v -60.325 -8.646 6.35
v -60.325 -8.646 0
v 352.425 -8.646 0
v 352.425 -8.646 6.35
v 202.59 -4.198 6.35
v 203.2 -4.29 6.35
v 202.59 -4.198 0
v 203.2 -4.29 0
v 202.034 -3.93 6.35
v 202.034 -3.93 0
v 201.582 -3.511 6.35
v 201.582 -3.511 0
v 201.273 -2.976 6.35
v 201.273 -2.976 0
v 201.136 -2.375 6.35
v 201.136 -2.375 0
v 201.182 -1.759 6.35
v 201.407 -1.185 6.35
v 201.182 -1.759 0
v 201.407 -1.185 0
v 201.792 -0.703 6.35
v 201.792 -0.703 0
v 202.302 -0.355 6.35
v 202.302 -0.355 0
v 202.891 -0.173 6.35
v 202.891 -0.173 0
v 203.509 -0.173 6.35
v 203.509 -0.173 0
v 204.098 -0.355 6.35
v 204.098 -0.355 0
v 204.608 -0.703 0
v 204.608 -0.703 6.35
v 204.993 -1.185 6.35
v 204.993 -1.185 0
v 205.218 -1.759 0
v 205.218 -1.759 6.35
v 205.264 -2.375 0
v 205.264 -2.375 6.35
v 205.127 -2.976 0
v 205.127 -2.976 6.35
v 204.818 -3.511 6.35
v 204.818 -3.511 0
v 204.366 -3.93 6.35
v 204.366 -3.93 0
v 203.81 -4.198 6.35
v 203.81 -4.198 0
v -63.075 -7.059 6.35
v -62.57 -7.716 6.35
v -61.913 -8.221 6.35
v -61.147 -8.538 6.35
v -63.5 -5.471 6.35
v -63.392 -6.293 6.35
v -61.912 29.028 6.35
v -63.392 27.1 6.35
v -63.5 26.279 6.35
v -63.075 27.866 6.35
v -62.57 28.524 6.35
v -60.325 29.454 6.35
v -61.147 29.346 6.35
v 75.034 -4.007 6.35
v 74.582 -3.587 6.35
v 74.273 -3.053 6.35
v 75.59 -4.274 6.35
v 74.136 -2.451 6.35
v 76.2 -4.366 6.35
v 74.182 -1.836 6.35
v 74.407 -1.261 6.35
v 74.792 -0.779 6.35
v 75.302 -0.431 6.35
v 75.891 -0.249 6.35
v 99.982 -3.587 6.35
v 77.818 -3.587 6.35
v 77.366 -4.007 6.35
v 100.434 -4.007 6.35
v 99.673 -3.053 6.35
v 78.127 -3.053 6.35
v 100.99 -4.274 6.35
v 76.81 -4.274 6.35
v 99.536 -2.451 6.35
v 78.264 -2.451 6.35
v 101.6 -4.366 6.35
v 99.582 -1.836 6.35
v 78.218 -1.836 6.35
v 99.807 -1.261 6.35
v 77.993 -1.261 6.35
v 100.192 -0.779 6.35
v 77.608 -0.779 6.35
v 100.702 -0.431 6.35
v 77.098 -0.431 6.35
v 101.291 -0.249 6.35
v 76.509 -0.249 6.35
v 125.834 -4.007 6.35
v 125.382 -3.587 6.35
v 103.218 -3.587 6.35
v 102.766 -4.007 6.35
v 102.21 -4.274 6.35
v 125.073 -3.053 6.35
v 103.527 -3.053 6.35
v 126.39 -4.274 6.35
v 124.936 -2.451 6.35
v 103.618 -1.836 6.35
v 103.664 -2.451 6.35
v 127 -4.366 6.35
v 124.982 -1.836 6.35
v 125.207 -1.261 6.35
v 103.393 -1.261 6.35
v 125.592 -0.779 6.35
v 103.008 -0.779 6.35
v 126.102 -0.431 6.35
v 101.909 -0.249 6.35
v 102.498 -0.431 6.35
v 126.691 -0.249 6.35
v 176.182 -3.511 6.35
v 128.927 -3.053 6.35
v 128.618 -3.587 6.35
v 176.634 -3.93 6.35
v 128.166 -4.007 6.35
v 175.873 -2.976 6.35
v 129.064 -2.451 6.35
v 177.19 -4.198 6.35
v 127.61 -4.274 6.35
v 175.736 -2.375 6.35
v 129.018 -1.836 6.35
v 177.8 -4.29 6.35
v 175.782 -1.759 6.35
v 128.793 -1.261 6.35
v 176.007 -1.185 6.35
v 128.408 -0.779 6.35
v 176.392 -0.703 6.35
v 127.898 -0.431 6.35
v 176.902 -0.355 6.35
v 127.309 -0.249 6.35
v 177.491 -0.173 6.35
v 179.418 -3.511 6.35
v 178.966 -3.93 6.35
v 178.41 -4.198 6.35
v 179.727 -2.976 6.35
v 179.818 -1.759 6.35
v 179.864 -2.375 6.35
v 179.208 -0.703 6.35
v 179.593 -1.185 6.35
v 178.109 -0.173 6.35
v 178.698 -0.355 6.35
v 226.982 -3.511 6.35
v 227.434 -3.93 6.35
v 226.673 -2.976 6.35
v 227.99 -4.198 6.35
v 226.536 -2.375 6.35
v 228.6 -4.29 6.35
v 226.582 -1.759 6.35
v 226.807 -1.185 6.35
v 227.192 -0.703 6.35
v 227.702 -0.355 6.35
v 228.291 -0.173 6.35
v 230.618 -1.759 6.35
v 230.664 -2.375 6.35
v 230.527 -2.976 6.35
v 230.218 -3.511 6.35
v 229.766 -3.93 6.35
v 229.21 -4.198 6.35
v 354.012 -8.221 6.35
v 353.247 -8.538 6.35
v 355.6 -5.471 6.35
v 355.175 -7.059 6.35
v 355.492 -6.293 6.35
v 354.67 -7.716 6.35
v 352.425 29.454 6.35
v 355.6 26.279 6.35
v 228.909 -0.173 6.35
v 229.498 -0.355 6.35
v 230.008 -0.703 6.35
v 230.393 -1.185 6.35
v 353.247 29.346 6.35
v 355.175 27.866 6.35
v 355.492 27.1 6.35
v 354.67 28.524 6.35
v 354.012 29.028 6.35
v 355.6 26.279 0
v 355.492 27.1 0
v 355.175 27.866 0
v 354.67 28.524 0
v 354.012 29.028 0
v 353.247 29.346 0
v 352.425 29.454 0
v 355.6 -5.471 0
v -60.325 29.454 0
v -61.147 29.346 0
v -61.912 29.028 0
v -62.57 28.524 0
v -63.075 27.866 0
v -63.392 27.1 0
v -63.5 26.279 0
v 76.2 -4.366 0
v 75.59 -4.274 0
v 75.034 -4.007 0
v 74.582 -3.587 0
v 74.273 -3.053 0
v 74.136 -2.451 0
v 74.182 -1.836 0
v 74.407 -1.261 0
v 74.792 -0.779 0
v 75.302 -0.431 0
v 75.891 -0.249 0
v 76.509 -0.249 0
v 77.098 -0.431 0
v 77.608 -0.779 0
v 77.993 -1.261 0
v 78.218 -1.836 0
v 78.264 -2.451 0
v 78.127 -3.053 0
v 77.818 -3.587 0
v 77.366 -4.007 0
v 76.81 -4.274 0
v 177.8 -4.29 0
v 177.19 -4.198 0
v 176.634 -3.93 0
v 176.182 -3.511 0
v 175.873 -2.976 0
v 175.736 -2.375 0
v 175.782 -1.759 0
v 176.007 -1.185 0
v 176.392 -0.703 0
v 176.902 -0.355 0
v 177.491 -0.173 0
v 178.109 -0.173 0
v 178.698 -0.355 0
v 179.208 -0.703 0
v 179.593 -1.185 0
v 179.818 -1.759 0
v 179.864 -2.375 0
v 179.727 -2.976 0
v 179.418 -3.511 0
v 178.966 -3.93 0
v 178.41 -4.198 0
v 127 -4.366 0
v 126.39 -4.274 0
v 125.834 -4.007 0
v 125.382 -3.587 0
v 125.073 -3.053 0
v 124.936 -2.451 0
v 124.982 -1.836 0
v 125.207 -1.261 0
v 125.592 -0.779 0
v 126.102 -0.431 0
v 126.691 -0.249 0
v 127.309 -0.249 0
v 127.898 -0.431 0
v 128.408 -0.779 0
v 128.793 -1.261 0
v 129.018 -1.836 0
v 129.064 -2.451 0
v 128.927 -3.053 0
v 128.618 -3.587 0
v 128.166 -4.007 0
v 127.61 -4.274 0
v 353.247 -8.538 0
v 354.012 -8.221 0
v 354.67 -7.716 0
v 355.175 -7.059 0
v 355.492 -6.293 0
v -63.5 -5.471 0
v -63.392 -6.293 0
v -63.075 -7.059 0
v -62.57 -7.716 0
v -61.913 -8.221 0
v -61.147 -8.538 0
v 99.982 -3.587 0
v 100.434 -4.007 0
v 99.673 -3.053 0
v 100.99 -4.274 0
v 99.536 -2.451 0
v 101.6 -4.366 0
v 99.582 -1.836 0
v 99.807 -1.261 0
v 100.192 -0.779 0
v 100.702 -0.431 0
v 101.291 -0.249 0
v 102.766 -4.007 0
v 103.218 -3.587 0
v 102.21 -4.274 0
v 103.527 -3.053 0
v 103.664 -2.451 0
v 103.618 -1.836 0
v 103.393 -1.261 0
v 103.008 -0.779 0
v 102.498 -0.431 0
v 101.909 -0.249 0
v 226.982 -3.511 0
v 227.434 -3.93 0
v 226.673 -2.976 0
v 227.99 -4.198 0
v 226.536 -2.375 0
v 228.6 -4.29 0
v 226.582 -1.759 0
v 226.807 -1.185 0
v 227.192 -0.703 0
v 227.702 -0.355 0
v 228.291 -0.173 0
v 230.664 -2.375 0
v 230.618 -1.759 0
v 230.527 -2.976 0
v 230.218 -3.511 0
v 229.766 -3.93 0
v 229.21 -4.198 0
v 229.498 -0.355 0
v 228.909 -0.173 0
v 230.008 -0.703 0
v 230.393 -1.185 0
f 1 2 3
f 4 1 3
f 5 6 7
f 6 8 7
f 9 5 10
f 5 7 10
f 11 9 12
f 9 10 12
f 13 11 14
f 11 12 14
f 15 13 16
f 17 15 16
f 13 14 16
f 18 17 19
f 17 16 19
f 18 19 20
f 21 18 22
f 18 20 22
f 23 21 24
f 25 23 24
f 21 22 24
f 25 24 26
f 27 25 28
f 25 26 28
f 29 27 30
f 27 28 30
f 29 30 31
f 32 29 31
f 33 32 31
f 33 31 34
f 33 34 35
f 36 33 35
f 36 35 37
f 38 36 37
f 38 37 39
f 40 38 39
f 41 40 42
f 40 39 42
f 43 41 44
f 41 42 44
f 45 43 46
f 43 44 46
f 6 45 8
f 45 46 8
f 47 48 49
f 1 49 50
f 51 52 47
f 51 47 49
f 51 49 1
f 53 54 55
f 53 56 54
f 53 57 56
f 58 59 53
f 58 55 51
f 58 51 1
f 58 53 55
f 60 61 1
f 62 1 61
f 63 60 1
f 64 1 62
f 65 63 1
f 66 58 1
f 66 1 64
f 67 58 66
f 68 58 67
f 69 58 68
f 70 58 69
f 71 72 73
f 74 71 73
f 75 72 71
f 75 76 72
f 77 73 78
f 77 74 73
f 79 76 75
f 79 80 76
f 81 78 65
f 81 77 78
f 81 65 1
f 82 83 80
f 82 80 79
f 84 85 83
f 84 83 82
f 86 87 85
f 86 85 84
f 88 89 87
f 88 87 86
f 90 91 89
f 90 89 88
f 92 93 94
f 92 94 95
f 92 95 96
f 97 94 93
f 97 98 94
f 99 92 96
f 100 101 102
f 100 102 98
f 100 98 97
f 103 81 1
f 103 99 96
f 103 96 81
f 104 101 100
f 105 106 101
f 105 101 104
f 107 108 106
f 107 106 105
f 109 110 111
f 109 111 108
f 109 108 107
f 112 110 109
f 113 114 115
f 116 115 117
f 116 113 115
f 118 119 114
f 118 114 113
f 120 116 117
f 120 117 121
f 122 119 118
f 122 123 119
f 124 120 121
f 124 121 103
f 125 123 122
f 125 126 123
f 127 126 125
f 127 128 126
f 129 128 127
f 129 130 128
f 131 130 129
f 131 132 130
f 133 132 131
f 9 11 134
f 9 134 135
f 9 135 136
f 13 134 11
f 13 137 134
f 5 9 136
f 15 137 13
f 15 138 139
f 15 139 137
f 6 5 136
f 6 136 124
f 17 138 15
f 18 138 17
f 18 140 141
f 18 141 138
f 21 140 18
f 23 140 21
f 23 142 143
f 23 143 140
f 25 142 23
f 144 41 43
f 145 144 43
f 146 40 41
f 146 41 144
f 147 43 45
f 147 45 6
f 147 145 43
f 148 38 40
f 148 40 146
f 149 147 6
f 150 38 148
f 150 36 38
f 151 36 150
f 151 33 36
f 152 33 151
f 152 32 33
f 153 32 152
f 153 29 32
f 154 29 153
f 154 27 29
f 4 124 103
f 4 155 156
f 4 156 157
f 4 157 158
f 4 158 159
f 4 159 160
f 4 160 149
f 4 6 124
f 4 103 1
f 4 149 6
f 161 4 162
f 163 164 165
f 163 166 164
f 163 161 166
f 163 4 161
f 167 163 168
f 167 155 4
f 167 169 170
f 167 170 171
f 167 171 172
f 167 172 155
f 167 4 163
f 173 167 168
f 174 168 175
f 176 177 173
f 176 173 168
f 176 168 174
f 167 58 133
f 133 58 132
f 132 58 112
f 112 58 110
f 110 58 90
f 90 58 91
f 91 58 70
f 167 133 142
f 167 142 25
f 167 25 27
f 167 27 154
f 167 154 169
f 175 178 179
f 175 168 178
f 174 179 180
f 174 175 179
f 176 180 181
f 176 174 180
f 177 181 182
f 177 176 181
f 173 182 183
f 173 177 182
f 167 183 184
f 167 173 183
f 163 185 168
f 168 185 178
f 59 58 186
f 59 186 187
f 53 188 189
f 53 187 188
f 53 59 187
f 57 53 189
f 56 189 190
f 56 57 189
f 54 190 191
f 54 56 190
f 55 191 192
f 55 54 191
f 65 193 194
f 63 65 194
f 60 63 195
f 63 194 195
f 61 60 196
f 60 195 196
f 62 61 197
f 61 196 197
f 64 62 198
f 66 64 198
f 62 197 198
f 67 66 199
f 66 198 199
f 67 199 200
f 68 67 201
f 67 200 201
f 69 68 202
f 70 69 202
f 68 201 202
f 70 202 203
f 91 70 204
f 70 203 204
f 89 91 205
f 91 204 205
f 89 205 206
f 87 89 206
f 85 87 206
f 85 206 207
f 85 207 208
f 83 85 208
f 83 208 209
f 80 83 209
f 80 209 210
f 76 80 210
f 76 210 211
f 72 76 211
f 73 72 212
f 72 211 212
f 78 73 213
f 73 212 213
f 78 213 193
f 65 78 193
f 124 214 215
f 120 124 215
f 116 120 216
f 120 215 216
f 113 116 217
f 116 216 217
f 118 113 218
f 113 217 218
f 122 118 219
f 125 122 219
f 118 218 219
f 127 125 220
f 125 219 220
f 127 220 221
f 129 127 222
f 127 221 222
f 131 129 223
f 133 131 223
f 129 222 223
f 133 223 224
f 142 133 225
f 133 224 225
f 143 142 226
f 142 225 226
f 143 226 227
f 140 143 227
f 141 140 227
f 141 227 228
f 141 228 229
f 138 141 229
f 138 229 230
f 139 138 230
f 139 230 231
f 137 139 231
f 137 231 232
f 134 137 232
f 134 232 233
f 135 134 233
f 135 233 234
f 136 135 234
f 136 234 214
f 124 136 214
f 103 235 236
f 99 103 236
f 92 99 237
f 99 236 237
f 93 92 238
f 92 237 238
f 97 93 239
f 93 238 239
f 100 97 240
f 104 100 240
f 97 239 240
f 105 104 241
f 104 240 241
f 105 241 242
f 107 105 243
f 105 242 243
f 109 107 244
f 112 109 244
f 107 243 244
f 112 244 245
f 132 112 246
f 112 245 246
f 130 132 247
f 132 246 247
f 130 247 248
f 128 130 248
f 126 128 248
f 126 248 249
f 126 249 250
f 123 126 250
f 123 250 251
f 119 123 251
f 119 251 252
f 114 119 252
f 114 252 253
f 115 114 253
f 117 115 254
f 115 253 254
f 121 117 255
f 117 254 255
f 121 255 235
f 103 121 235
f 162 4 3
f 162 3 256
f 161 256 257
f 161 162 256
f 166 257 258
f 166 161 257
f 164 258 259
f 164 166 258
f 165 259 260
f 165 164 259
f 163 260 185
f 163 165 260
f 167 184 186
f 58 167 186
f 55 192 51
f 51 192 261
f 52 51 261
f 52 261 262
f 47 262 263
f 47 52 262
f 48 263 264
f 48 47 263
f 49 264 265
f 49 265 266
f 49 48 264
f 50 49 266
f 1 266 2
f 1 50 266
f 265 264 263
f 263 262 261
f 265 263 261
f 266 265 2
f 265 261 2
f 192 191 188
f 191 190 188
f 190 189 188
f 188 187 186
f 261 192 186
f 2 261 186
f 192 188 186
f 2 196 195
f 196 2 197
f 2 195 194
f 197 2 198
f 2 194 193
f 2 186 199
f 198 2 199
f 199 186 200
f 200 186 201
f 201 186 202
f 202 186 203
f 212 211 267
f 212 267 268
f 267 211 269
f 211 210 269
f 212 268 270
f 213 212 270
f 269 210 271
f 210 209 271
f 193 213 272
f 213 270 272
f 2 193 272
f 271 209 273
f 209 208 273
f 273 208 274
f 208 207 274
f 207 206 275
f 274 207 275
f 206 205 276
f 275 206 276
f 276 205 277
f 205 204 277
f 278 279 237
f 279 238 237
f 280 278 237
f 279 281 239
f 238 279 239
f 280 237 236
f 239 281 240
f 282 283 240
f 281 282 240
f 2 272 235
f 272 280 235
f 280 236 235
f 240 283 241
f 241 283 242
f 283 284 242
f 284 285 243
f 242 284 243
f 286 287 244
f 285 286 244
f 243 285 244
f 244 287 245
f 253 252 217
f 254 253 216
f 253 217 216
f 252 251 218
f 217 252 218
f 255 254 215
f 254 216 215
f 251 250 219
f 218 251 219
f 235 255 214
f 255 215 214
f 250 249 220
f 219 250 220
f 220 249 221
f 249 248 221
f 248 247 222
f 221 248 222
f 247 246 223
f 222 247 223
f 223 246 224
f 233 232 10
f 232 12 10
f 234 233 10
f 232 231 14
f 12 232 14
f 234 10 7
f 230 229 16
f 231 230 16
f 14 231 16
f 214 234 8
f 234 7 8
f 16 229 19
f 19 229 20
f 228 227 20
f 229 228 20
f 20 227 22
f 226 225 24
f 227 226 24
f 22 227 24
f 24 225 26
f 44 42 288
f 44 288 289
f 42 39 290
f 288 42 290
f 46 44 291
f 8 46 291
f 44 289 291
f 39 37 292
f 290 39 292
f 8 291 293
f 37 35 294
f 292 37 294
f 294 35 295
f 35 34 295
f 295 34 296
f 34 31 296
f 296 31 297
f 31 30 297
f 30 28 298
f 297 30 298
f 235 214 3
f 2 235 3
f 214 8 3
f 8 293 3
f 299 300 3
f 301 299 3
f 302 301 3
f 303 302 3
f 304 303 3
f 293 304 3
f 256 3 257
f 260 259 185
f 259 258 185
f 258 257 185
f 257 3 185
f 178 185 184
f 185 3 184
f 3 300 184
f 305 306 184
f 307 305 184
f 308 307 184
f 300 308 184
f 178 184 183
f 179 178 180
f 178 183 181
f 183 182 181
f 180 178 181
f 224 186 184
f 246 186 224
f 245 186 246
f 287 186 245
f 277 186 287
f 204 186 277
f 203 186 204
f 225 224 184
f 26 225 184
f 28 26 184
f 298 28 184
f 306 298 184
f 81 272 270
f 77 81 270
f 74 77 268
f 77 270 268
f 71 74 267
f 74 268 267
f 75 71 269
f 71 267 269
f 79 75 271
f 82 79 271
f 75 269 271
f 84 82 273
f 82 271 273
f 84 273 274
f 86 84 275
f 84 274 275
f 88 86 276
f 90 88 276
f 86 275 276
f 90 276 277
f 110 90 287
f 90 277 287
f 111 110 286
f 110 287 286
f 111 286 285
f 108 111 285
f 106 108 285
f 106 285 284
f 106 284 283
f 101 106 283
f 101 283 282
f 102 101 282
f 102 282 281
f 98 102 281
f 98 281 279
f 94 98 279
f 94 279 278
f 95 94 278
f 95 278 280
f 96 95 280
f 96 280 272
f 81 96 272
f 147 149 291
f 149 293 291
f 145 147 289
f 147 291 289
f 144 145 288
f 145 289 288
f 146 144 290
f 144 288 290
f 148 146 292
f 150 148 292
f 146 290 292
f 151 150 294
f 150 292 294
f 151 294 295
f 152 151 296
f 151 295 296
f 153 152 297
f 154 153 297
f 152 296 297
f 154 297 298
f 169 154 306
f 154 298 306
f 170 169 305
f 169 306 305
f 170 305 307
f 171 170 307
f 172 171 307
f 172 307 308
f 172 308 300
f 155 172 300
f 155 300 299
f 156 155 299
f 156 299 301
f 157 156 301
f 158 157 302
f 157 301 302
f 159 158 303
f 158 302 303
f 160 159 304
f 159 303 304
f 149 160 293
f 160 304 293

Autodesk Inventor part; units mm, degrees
ref_plane "YZ Plane" through (0, 0, 0) normal (1, 0, 0) x (0, 1, 0)
ref_plane "XZ Plane" through (0, 0, 0) normal (0, 1, 0) x (-1, 0, 0)
sketch "Sketch1" plane through (0, 0, 0) normal (0, 0, 1) x (1, 0, 0)
  line L0 (-63.5, -8.6463) -> (355.6, -8.6463)
  line L1 (355.6, -8.6463) -> (355.6, 29.4537)
  line L2 (355.6, 29.4537) -> (-63.5, 29.4537)
  line L3 (-63.5, 29.4537) -> (-63.5, -8.6463)
  line L4 (355.6, -8.6463) -> (69.85, -8.6463)
  point P0 (0, 0)
  dimension "d0" = 419.1
  dimension "d27" = 38.1
ref_plane "Work Plane1" through (0, 0, 6.35) normal (0, 0, 1) x (1, 0, 0)
sketch "Sketch2" plane through (0, 0, 6.35) normal (0, 0, 1) x (1, 0, 0)
  point P0 (0, 0)
extrude "Extrusion1" add sketch "Sketch1" along normal blind 6.35
fillet "Fillet1" radius 3.175 4 edges at (355.6, 29.4537, 3.175) (355.6, -8.6463, 3.175) (-63.5, 29.4537, 3.175) (-63.5, -8.6463, 3.175)
sketch "Sketch3" plane through (0, 0, 6.35) normal (0, 0, 1) x (1, 0, 0)
  line L0 (-355.6, 35.8037) -> (355.6, 35.8037)
  line L1 (355.6, 35.8037) -> (355.6, 33.2637)
  line L2 (355.6, 33.2637) -> (-355.6, 33.2637)
  line L3 (355.6, -14.9201) -> (-355.6, -14.9201)
  line L4 (355.6, -12.4563) -> (355.6, -14.9201)
  line L5 (355.6, 33.2637) -> (355.6, -12.4563)
  line L6 (-355.6, -12.4563) -> (355.6, -12.4563)
  circle A0 centre (190.5, -2.2201) radius 2.0701
  circle A1 centre (215.9, -2.2201) radius 2.0701
  circle A2 centre (228.6, -2.2201) radius 2.0701
  circle A3 centre (203.2, -2.2201) radius 2.0701
  circle A4 centre (76.2, -2.2963) radius 2.0701
  circle A5 centre (101.6, -2.2963) radius 2.0701
  circle A6 centre (127, -2.2963) radius 2.0701
  circle A7 centre (177.8, -2.2201) radius 2.0701
hole "Hole1" at (76.2, -2.2963, 6.35) at (101.6, -2.2963, 6.35) at (127, -2.2963, 6.35) at (177.8, -2.2201, 6.35) at (203.2, -2.2201, 6.35) at (228.6, -2.2201, 6.35) direction (0, 0, -1) diameter 4.1402 end through all
properties part number "C31_TK_LEDHolder" material "Polycarbonate, Clear"
